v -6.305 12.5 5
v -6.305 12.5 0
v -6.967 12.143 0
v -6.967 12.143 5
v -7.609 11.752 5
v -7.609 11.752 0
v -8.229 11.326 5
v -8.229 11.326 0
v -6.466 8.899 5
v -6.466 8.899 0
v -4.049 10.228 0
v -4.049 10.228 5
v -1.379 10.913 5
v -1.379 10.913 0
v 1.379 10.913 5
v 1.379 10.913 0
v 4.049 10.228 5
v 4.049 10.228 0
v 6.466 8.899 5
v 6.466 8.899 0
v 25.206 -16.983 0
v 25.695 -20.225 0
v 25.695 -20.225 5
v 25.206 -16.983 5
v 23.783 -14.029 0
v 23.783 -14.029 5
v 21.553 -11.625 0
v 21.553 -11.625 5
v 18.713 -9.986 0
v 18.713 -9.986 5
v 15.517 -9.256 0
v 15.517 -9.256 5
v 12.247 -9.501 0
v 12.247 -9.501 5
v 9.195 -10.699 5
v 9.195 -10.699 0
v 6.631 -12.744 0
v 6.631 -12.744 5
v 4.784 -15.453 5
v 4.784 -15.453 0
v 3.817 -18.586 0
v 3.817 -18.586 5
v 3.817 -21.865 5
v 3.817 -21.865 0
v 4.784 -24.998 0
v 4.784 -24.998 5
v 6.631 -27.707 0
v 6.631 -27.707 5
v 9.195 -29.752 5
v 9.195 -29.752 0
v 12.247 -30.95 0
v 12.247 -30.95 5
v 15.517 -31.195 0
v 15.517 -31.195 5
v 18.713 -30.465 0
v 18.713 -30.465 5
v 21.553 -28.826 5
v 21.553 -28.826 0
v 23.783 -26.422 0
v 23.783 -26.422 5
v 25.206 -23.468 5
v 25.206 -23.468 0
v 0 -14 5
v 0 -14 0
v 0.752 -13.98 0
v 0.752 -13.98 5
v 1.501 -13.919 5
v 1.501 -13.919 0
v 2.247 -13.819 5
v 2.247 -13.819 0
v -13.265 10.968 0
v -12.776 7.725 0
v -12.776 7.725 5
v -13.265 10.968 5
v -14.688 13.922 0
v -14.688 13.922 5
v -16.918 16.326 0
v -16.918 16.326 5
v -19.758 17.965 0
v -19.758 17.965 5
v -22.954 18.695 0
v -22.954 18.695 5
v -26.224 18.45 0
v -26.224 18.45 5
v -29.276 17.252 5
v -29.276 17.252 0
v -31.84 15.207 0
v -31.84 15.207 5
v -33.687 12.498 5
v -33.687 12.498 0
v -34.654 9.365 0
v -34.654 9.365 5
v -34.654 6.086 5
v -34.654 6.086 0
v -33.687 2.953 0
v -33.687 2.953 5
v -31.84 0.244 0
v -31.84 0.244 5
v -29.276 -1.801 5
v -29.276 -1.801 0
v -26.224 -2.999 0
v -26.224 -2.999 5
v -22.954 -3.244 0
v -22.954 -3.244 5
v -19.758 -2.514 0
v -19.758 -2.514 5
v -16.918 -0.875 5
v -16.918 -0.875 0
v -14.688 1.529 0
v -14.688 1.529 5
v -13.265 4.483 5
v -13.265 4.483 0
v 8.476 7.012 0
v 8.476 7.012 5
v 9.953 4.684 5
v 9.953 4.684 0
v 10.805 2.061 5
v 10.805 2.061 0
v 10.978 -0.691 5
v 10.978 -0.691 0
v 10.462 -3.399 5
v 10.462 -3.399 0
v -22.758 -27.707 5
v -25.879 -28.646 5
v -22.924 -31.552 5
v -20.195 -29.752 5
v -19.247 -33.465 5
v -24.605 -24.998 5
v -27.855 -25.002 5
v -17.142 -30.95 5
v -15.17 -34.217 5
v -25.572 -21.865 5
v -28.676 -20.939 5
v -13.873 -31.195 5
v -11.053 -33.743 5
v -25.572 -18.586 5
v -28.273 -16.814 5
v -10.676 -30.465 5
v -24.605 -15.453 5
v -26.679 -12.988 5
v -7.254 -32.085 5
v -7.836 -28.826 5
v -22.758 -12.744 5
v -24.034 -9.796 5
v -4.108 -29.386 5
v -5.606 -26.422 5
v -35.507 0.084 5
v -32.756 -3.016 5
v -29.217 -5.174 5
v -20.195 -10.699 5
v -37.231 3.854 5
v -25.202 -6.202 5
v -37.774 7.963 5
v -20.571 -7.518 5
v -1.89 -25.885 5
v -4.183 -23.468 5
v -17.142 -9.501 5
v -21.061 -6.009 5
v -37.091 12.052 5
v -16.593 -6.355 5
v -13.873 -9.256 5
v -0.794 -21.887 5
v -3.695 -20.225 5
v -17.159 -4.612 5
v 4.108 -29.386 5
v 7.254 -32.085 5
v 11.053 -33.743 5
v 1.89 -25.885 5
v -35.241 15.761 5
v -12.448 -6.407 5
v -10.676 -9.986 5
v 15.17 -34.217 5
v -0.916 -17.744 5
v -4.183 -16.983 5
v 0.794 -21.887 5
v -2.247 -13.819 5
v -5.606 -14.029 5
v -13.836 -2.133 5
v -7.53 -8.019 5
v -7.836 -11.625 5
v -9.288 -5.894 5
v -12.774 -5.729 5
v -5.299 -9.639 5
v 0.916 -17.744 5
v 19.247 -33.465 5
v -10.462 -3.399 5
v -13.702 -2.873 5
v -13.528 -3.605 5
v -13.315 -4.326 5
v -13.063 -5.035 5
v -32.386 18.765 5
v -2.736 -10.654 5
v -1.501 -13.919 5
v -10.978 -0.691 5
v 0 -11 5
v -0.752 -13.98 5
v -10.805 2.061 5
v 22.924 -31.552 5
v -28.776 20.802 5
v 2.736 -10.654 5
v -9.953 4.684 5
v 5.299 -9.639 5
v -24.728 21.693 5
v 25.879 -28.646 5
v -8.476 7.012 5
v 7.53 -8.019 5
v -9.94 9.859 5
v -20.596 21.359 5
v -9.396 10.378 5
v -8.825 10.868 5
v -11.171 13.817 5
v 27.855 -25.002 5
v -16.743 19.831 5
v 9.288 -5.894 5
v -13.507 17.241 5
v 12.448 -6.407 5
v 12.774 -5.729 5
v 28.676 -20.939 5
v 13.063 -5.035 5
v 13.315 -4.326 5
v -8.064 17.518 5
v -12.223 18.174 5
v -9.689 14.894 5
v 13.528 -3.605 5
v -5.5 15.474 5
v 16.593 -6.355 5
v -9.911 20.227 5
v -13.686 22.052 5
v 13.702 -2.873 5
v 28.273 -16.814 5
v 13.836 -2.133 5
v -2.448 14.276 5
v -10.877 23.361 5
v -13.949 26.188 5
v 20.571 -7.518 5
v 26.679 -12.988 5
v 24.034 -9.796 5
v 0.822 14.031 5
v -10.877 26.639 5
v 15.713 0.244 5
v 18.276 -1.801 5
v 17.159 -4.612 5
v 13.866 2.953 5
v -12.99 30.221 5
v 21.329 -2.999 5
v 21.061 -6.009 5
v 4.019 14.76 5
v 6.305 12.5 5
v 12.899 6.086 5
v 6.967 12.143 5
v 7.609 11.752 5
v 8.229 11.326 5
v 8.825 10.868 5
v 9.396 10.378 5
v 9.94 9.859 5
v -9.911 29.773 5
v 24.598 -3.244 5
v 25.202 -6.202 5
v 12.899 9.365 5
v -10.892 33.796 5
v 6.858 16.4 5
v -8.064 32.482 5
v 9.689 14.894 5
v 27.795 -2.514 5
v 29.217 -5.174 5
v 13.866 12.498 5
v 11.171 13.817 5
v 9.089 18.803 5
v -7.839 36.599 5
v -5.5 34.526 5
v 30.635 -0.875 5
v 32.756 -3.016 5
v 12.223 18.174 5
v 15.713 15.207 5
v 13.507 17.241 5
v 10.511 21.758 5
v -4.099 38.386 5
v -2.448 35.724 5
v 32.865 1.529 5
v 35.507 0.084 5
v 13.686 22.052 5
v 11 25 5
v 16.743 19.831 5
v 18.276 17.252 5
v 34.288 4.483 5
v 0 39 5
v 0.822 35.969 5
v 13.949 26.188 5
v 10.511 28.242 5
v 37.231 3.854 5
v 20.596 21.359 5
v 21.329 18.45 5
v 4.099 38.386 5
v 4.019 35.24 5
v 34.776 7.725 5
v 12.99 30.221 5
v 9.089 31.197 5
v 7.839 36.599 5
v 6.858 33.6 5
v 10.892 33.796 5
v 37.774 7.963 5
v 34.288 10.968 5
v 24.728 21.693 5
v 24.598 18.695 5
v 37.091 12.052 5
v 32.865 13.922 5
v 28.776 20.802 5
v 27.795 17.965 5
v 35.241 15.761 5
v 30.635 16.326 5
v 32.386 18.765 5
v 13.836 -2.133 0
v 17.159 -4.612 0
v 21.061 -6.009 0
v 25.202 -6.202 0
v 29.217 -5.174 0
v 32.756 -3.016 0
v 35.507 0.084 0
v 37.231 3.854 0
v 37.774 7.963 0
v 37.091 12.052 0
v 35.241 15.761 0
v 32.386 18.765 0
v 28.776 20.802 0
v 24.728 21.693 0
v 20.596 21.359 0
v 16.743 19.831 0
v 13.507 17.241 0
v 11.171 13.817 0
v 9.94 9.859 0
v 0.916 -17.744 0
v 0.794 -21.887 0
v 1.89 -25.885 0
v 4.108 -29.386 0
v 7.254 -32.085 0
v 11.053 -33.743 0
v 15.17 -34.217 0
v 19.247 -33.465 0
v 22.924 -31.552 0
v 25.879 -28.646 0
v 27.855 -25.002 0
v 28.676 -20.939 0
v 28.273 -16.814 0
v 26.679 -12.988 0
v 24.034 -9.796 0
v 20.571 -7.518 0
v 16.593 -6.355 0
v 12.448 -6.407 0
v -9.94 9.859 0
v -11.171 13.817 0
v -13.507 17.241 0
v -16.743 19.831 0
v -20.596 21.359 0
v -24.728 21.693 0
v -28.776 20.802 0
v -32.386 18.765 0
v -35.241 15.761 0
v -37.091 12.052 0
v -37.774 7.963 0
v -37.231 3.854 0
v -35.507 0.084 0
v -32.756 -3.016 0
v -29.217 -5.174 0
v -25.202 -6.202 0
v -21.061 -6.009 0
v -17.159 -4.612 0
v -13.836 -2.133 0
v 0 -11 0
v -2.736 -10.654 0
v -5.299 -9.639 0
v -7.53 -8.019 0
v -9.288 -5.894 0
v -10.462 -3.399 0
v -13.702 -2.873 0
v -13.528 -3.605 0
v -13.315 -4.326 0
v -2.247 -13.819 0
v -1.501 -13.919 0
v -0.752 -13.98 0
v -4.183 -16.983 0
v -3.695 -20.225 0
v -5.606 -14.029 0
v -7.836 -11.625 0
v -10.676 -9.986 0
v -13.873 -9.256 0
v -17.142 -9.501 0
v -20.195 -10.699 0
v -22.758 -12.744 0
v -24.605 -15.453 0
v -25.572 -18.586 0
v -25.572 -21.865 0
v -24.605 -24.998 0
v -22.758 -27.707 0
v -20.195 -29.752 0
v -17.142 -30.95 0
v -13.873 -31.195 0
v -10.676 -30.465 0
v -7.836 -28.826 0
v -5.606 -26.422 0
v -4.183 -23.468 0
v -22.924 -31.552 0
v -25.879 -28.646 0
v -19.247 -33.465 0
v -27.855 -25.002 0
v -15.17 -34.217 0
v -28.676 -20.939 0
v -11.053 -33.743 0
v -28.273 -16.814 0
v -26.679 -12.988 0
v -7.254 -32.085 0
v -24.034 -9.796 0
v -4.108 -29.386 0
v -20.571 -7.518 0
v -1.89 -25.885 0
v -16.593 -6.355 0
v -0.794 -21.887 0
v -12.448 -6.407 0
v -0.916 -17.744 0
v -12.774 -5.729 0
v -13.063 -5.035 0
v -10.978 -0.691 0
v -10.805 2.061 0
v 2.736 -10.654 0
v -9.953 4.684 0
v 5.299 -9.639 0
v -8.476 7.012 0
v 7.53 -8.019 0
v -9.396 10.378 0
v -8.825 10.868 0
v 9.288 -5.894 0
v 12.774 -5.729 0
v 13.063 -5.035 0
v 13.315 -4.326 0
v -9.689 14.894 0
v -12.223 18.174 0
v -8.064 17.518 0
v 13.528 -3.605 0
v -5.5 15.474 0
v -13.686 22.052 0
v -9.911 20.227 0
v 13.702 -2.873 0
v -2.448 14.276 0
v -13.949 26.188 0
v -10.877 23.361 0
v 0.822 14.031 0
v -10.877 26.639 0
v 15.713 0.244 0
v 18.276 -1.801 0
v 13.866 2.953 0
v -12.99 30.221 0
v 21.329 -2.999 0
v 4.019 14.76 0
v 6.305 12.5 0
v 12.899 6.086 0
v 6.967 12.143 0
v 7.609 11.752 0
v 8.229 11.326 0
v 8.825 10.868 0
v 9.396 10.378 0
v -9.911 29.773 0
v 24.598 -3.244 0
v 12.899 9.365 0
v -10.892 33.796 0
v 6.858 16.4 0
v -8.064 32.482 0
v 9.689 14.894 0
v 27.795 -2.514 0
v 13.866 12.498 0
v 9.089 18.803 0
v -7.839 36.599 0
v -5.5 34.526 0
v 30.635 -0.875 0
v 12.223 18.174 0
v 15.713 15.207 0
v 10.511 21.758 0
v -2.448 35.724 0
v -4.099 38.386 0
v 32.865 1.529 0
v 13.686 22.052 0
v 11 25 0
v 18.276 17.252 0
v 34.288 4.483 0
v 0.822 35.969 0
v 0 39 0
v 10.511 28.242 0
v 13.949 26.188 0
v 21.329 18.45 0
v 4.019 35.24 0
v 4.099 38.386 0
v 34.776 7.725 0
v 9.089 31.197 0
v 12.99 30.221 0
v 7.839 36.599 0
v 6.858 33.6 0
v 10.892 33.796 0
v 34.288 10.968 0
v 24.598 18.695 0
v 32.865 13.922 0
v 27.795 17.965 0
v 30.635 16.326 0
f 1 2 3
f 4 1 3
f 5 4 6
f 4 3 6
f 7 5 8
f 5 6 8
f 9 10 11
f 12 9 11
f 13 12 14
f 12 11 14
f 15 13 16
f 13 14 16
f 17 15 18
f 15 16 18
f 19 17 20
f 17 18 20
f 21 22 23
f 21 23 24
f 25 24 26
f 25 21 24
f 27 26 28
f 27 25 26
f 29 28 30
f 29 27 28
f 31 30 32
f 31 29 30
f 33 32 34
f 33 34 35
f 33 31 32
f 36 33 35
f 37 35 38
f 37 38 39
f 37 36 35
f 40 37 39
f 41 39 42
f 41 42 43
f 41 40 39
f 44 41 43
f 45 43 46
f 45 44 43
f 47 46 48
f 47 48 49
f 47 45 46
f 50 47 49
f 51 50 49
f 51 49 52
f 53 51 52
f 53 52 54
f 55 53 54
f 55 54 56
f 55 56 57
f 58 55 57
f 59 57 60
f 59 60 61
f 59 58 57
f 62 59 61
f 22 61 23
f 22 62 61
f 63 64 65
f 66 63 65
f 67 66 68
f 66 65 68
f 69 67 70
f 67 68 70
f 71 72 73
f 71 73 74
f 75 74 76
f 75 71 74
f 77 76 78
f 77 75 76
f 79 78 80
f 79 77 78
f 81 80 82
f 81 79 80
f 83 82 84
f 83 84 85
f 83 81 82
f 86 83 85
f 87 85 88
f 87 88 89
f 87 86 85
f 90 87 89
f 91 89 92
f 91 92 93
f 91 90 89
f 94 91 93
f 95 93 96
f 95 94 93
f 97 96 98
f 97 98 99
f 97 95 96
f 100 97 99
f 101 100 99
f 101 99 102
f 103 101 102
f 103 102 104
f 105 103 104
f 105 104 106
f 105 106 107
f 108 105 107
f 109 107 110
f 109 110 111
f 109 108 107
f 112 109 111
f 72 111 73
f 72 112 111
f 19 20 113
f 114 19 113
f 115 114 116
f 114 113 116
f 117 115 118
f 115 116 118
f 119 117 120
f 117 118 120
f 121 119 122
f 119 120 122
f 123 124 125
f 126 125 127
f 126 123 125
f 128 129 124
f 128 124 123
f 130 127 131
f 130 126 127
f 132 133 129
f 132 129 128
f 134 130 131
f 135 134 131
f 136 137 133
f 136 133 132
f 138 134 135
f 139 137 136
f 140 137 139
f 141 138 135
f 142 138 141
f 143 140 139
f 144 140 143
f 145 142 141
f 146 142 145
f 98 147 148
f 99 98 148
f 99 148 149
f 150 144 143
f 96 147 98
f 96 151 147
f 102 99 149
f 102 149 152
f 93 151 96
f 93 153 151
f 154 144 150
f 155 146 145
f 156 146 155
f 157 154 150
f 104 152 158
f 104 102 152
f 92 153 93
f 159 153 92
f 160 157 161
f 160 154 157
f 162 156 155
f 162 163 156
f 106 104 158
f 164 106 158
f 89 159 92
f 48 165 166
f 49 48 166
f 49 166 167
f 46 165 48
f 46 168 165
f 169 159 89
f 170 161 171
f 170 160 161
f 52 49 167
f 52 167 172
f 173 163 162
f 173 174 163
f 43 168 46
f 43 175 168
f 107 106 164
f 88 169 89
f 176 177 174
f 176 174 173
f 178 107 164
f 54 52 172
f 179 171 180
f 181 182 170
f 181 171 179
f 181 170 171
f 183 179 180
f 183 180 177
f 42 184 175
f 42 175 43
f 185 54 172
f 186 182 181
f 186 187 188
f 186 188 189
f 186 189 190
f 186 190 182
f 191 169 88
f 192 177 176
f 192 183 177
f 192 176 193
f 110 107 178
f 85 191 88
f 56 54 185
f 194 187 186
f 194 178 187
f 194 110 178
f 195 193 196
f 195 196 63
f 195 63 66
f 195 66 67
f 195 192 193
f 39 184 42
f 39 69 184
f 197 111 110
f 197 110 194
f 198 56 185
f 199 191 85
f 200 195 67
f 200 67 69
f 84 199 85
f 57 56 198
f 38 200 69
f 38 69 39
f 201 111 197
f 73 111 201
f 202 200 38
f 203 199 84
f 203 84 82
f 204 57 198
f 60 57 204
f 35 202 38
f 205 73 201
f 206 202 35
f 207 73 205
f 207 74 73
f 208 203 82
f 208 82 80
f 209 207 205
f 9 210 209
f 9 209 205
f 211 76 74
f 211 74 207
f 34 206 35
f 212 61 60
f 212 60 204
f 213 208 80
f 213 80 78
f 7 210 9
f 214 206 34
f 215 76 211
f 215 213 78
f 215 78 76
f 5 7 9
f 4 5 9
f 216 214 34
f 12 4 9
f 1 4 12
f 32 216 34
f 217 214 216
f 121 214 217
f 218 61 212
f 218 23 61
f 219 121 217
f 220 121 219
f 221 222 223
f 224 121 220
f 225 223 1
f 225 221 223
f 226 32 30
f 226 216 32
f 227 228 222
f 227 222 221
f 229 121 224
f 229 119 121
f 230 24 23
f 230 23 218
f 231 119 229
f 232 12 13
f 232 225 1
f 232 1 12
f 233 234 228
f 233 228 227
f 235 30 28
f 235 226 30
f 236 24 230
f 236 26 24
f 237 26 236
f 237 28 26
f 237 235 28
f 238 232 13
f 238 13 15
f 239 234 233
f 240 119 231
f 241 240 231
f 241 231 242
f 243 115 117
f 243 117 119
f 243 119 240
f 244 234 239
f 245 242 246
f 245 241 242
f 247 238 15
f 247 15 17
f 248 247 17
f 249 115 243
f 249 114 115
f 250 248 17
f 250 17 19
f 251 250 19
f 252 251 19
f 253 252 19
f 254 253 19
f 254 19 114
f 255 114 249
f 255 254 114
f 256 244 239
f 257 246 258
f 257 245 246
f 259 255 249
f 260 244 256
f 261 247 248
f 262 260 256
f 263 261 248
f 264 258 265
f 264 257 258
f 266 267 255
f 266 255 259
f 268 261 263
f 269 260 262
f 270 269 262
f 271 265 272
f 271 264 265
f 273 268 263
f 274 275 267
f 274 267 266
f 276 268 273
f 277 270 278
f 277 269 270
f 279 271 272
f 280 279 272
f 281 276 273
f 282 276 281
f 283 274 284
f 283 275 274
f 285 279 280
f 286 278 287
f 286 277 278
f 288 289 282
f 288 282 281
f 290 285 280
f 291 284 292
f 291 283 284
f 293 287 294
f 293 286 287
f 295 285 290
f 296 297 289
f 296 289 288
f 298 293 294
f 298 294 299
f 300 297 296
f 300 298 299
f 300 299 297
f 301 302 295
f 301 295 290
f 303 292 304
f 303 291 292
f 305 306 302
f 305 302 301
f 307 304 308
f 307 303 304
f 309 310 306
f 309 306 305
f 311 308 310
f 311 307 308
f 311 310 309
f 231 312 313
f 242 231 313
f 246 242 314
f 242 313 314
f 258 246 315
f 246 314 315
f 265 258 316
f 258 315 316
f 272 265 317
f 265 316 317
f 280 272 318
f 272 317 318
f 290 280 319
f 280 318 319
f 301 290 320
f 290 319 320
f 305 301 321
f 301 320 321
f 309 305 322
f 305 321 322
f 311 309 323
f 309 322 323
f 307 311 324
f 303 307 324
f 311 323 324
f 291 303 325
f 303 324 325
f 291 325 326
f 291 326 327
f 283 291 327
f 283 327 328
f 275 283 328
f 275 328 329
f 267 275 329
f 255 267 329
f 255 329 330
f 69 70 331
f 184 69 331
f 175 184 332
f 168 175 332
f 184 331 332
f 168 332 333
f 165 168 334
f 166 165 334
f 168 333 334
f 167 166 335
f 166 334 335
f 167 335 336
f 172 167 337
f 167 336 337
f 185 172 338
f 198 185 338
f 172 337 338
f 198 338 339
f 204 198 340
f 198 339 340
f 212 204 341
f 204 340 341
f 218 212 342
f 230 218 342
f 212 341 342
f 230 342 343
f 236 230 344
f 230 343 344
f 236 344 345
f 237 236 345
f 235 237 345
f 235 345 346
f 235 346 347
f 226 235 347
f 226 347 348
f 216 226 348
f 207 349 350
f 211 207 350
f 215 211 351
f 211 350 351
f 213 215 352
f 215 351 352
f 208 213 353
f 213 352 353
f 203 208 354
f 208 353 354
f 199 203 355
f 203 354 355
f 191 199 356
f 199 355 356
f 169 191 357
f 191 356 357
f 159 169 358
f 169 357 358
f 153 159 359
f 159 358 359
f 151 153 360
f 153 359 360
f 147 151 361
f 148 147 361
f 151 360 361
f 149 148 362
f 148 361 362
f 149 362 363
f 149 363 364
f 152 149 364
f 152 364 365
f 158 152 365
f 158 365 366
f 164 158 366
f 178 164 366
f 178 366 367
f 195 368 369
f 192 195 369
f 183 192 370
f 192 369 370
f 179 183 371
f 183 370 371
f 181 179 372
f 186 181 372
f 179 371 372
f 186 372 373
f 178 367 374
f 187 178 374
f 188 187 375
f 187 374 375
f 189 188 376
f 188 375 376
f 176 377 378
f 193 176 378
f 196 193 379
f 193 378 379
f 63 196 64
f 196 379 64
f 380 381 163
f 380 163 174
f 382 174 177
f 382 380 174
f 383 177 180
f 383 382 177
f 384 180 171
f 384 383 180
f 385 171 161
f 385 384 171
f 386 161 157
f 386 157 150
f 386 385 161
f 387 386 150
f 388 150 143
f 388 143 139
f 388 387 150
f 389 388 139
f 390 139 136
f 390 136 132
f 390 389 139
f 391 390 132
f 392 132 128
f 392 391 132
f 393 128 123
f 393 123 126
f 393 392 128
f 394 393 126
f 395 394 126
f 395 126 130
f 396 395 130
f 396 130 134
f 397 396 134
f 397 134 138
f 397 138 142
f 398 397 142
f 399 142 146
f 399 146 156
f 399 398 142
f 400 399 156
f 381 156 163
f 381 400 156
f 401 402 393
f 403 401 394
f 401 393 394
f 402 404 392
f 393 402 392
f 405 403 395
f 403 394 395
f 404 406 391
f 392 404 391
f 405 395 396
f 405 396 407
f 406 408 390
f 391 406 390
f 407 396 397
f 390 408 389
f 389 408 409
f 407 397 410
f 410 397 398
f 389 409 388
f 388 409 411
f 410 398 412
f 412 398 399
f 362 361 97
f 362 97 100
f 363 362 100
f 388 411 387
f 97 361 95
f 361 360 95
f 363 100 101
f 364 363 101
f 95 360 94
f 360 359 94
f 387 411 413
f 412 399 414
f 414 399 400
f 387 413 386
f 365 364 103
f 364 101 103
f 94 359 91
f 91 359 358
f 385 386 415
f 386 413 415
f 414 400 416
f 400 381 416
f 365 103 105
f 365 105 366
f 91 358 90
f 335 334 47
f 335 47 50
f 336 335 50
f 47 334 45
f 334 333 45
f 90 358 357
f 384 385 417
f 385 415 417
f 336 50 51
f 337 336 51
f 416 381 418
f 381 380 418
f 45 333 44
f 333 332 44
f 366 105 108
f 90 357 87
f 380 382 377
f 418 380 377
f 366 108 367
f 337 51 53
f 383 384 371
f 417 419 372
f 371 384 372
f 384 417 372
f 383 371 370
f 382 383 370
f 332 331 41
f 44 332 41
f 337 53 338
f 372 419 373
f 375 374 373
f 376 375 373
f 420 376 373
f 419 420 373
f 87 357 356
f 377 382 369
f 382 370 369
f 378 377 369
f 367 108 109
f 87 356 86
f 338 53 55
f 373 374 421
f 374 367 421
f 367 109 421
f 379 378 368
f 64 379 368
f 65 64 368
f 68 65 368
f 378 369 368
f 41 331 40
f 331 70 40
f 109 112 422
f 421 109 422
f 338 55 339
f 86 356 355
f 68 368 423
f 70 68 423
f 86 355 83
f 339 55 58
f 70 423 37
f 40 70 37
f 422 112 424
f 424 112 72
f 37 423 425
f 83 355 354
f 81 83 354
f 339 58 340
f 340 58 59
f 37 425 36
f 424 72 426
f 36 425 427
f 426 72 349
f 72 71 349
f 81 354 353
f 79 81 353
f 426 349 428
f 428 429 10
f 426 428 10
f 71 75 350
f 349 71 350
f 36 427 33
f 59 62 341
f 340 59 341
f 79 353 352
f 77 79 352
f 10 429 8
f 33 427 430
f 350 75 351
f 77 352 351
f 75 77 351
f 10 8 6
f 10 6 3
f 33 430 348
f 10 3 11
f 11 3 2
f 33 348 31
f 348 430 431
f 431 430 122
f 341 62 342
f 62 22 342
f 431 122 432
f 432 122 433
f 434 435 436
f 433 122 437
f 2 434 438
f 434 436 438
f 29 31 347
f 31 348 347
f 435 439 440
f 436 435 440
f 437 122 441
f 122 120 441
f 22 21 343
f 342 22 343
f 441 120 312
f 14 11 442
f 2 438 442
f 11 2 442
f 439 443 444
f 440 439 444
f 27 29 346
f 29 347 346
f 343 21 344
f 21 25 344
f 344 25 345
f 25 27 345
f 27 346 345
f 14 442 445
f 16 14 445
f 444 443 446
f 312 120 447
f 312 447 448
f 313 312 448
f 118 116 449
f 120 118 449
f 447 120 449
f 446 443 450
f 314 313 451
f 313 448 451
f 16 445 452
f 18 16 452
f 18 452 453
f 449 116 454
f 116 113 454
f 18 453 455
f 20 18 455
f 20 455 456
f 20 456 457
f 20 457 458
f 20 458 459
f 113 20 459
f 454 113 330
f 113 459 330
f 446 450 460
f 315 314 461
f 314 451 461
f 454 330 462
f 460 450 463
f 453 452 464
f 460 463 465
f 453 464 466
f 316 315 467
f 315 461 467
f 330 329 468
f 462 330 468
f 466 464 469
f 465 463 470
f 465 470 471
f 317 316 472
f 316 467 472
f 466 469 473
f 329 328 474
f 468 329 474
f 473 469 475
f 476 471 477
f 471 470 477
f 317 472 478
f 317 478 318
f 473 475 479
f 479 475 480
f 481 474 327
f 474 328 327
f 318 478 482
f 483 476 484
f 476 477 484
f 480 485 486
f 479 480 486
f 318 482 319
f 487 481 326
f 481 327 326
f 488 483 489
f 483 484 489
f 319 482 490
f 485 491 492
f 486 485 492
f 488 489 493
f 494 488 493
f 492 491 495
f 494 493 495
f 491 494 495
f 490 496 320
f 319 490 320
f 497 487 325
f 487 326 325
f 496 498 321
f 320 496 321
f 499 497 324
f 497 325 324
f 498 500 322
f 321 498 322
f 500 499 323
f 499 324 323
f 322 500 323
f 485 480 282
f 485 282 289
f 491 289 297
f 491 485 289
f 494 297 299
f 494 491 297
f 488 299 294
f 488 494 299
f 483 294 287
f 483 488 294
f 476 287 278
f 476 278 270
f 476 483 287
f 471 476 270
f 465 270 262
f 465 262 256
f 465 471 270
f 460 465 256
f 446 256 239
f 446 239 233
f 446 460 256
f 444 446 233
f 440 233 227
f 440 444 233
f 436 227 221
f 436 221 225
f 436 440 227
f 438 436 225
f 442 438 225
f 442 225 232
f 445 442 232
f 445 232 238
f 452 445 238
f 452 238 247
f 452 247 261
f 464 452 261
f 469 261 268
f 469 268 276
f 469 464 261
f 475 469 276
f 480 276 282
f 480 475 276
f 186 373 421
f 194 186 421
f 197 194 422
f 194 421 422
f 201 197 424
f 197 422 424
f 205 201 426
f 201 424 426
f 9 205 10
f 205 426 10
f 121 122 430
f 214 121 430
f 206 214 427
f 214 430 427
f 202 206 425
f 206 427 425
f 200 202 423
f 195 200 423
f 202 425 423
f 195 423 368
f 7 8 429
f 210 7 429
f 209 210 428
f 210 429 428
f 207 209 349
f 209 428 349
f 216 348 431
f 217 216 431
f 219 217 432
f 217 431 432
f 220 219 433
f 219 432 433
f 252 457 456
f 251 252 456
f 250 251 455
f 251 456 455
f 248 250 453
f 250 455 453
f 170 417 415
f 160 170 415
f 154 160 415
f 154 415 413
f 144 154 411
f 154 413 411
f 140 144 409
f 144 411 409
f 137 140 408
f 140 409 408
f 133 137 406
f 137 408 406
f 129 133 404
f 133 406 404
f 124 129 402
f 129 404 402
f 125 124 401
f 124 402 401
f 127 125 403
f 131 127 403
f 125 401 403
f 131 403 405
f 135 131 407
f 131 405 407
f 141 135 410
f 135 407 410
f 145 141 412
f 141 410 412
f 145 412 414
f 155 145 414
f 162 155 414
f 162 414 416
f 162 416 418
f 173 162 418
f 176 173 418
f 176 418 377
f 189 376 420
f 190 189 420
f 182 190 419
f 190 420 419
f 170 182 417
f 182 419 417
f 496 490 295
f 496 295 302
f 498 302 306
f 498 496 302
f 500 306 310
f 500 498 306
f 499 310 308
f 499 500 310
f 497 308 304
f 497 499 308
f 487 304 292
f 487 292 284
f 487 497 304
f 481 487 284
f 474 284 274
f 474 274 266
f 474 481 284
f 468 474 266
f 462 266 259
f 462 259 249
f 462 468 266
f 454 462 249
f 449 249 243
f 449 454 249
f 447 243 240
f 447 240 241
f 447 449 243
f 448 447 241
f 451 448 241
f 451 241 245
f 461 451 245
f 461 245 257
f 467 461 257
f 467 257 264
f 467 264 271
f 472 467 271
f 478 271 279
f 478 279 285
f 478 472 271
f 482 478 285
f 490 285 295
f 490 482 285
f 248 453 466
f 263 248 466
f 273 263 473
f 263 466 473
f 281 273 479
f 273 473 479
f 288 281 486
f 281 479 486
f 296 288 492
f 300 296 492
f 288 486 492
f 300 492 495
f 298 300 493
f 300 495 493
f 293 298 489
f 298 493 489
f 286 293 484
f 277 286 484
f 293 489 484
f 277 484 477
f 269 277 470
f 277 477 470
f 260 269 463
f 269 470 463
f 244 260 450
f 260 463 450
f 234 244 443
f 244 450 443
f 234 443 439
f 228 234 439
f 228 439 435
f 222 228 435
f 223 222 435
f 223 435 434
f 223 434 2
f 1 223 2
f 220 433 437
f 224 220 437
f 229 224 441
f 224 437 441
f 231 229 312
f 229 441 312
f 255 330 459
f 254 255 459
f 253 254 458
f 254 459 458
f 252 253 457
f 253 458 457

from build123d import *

# Parameters (mm, degrees)
F0_R     = 11
F1_DEPTH = 5


with BuildPart() as f1:
    # F0 (on Top) → F1 (new body)
    with BuildSketch(Plane.XY):
        with BuildLine():
            ThreePointArc((8.228994, 11.326238), (7.290537, 11.951907), (6.30476, 12.5))
            ThreePointArc((6.30476, 12.5), (0, 39), (-6.30476, 12.5))
            ThreePointArc((-6.30476, 12.5), (-7.290537, 11.951907), (-8.228994, 11.326238))
            ThreePointArc((-8.228994, 11.326238), (-9.114039, 10.627055), (-9.939928, 9.858896))
            ThreePointArc((-9.939928, 9.858896), (-37.091204, 12.051663), (-13.836484, -2.133471))
            ThreePointArc((-13.836484, -2.133471), (-13.619838, -3.24037), (-13.314791, -4.326238))
            ThreePointArc((-13.314791, -4.326238), (-12.923323, -5.384026), (-12.447974, -6.406867))
            ThreePointArc((-12.447974, -6.406867), (-22.923625, -31.551663), (-2.246658, -13.818557))
            ThreePointArc((-2.246658, -13.818557), (-1.126986, -13.954566), (0, -14))
            ThreePointArc((0, -14), (1.126986, -13.954566), (2.246658, -13.818557))
            ThreePointArc((2.246658, -13.818557), (22.923625, -31.551663), (12.447974, -6.406867))
            ThreePointArc((12.447974, -6.406867), (12.923323, -5.384026), (13.314791, -4.326238))
            ThreePointArc((13.314791, -4.326238), (13.619838, -3.24037), (13.836484, -2.133471))
            ThreePointArc((13.836484, -2.133471), (37.091204, 12.051663), (9.939928, 9.858896))
            ThreePointArc((9.939928, 9.858896), (9.114039, 10.627055), (8.228994, 11.326238))
        make_face()
        with Locations((-14.694631, -20.225425)):
            Circle(F0_R, mode=Mode.SUBTRACT)
        with Locations((14.694631, -20.225425)):
            Circle(F0_R, mode=Mode.SUBTRACT)
        with BuildLine():
            ThreePointArc((-6.465638, 8.899187), (0, 11), (6.465638, 8.899187))
            ThreePointArc((6.465638, 8.899187), (10.461622, 3.399187), (10.461622, -3.399187))
            ThreePointArc((10.461622, -3.399187), (6.465638, -8.899187), (0, -11))
            ThreePointArc((0, -11), (-6.465638, -8.899187), (-10.461622, -3.399187))
            ThreePointArc((-10.461622, -3.399187), (-10.461622, 3.399187), (-6.465638, 8.899187))
        make_face(mode=Mode.SUBTRACT)
        with Locations((-23.776413, 7.725425)):
            Circle(F0_R, mode=Mode.SUBTRACT)
        with Locations((23.776413, 7.725425)):
            Circle(F0_R, mode=Mode.SUBTRACT)
        with Locations((0, 25)):
            Circle(F0_R, mode=Mode.SUBTRACT)
    extrude(amount=F1_DEPTH)


solid = f1.part
